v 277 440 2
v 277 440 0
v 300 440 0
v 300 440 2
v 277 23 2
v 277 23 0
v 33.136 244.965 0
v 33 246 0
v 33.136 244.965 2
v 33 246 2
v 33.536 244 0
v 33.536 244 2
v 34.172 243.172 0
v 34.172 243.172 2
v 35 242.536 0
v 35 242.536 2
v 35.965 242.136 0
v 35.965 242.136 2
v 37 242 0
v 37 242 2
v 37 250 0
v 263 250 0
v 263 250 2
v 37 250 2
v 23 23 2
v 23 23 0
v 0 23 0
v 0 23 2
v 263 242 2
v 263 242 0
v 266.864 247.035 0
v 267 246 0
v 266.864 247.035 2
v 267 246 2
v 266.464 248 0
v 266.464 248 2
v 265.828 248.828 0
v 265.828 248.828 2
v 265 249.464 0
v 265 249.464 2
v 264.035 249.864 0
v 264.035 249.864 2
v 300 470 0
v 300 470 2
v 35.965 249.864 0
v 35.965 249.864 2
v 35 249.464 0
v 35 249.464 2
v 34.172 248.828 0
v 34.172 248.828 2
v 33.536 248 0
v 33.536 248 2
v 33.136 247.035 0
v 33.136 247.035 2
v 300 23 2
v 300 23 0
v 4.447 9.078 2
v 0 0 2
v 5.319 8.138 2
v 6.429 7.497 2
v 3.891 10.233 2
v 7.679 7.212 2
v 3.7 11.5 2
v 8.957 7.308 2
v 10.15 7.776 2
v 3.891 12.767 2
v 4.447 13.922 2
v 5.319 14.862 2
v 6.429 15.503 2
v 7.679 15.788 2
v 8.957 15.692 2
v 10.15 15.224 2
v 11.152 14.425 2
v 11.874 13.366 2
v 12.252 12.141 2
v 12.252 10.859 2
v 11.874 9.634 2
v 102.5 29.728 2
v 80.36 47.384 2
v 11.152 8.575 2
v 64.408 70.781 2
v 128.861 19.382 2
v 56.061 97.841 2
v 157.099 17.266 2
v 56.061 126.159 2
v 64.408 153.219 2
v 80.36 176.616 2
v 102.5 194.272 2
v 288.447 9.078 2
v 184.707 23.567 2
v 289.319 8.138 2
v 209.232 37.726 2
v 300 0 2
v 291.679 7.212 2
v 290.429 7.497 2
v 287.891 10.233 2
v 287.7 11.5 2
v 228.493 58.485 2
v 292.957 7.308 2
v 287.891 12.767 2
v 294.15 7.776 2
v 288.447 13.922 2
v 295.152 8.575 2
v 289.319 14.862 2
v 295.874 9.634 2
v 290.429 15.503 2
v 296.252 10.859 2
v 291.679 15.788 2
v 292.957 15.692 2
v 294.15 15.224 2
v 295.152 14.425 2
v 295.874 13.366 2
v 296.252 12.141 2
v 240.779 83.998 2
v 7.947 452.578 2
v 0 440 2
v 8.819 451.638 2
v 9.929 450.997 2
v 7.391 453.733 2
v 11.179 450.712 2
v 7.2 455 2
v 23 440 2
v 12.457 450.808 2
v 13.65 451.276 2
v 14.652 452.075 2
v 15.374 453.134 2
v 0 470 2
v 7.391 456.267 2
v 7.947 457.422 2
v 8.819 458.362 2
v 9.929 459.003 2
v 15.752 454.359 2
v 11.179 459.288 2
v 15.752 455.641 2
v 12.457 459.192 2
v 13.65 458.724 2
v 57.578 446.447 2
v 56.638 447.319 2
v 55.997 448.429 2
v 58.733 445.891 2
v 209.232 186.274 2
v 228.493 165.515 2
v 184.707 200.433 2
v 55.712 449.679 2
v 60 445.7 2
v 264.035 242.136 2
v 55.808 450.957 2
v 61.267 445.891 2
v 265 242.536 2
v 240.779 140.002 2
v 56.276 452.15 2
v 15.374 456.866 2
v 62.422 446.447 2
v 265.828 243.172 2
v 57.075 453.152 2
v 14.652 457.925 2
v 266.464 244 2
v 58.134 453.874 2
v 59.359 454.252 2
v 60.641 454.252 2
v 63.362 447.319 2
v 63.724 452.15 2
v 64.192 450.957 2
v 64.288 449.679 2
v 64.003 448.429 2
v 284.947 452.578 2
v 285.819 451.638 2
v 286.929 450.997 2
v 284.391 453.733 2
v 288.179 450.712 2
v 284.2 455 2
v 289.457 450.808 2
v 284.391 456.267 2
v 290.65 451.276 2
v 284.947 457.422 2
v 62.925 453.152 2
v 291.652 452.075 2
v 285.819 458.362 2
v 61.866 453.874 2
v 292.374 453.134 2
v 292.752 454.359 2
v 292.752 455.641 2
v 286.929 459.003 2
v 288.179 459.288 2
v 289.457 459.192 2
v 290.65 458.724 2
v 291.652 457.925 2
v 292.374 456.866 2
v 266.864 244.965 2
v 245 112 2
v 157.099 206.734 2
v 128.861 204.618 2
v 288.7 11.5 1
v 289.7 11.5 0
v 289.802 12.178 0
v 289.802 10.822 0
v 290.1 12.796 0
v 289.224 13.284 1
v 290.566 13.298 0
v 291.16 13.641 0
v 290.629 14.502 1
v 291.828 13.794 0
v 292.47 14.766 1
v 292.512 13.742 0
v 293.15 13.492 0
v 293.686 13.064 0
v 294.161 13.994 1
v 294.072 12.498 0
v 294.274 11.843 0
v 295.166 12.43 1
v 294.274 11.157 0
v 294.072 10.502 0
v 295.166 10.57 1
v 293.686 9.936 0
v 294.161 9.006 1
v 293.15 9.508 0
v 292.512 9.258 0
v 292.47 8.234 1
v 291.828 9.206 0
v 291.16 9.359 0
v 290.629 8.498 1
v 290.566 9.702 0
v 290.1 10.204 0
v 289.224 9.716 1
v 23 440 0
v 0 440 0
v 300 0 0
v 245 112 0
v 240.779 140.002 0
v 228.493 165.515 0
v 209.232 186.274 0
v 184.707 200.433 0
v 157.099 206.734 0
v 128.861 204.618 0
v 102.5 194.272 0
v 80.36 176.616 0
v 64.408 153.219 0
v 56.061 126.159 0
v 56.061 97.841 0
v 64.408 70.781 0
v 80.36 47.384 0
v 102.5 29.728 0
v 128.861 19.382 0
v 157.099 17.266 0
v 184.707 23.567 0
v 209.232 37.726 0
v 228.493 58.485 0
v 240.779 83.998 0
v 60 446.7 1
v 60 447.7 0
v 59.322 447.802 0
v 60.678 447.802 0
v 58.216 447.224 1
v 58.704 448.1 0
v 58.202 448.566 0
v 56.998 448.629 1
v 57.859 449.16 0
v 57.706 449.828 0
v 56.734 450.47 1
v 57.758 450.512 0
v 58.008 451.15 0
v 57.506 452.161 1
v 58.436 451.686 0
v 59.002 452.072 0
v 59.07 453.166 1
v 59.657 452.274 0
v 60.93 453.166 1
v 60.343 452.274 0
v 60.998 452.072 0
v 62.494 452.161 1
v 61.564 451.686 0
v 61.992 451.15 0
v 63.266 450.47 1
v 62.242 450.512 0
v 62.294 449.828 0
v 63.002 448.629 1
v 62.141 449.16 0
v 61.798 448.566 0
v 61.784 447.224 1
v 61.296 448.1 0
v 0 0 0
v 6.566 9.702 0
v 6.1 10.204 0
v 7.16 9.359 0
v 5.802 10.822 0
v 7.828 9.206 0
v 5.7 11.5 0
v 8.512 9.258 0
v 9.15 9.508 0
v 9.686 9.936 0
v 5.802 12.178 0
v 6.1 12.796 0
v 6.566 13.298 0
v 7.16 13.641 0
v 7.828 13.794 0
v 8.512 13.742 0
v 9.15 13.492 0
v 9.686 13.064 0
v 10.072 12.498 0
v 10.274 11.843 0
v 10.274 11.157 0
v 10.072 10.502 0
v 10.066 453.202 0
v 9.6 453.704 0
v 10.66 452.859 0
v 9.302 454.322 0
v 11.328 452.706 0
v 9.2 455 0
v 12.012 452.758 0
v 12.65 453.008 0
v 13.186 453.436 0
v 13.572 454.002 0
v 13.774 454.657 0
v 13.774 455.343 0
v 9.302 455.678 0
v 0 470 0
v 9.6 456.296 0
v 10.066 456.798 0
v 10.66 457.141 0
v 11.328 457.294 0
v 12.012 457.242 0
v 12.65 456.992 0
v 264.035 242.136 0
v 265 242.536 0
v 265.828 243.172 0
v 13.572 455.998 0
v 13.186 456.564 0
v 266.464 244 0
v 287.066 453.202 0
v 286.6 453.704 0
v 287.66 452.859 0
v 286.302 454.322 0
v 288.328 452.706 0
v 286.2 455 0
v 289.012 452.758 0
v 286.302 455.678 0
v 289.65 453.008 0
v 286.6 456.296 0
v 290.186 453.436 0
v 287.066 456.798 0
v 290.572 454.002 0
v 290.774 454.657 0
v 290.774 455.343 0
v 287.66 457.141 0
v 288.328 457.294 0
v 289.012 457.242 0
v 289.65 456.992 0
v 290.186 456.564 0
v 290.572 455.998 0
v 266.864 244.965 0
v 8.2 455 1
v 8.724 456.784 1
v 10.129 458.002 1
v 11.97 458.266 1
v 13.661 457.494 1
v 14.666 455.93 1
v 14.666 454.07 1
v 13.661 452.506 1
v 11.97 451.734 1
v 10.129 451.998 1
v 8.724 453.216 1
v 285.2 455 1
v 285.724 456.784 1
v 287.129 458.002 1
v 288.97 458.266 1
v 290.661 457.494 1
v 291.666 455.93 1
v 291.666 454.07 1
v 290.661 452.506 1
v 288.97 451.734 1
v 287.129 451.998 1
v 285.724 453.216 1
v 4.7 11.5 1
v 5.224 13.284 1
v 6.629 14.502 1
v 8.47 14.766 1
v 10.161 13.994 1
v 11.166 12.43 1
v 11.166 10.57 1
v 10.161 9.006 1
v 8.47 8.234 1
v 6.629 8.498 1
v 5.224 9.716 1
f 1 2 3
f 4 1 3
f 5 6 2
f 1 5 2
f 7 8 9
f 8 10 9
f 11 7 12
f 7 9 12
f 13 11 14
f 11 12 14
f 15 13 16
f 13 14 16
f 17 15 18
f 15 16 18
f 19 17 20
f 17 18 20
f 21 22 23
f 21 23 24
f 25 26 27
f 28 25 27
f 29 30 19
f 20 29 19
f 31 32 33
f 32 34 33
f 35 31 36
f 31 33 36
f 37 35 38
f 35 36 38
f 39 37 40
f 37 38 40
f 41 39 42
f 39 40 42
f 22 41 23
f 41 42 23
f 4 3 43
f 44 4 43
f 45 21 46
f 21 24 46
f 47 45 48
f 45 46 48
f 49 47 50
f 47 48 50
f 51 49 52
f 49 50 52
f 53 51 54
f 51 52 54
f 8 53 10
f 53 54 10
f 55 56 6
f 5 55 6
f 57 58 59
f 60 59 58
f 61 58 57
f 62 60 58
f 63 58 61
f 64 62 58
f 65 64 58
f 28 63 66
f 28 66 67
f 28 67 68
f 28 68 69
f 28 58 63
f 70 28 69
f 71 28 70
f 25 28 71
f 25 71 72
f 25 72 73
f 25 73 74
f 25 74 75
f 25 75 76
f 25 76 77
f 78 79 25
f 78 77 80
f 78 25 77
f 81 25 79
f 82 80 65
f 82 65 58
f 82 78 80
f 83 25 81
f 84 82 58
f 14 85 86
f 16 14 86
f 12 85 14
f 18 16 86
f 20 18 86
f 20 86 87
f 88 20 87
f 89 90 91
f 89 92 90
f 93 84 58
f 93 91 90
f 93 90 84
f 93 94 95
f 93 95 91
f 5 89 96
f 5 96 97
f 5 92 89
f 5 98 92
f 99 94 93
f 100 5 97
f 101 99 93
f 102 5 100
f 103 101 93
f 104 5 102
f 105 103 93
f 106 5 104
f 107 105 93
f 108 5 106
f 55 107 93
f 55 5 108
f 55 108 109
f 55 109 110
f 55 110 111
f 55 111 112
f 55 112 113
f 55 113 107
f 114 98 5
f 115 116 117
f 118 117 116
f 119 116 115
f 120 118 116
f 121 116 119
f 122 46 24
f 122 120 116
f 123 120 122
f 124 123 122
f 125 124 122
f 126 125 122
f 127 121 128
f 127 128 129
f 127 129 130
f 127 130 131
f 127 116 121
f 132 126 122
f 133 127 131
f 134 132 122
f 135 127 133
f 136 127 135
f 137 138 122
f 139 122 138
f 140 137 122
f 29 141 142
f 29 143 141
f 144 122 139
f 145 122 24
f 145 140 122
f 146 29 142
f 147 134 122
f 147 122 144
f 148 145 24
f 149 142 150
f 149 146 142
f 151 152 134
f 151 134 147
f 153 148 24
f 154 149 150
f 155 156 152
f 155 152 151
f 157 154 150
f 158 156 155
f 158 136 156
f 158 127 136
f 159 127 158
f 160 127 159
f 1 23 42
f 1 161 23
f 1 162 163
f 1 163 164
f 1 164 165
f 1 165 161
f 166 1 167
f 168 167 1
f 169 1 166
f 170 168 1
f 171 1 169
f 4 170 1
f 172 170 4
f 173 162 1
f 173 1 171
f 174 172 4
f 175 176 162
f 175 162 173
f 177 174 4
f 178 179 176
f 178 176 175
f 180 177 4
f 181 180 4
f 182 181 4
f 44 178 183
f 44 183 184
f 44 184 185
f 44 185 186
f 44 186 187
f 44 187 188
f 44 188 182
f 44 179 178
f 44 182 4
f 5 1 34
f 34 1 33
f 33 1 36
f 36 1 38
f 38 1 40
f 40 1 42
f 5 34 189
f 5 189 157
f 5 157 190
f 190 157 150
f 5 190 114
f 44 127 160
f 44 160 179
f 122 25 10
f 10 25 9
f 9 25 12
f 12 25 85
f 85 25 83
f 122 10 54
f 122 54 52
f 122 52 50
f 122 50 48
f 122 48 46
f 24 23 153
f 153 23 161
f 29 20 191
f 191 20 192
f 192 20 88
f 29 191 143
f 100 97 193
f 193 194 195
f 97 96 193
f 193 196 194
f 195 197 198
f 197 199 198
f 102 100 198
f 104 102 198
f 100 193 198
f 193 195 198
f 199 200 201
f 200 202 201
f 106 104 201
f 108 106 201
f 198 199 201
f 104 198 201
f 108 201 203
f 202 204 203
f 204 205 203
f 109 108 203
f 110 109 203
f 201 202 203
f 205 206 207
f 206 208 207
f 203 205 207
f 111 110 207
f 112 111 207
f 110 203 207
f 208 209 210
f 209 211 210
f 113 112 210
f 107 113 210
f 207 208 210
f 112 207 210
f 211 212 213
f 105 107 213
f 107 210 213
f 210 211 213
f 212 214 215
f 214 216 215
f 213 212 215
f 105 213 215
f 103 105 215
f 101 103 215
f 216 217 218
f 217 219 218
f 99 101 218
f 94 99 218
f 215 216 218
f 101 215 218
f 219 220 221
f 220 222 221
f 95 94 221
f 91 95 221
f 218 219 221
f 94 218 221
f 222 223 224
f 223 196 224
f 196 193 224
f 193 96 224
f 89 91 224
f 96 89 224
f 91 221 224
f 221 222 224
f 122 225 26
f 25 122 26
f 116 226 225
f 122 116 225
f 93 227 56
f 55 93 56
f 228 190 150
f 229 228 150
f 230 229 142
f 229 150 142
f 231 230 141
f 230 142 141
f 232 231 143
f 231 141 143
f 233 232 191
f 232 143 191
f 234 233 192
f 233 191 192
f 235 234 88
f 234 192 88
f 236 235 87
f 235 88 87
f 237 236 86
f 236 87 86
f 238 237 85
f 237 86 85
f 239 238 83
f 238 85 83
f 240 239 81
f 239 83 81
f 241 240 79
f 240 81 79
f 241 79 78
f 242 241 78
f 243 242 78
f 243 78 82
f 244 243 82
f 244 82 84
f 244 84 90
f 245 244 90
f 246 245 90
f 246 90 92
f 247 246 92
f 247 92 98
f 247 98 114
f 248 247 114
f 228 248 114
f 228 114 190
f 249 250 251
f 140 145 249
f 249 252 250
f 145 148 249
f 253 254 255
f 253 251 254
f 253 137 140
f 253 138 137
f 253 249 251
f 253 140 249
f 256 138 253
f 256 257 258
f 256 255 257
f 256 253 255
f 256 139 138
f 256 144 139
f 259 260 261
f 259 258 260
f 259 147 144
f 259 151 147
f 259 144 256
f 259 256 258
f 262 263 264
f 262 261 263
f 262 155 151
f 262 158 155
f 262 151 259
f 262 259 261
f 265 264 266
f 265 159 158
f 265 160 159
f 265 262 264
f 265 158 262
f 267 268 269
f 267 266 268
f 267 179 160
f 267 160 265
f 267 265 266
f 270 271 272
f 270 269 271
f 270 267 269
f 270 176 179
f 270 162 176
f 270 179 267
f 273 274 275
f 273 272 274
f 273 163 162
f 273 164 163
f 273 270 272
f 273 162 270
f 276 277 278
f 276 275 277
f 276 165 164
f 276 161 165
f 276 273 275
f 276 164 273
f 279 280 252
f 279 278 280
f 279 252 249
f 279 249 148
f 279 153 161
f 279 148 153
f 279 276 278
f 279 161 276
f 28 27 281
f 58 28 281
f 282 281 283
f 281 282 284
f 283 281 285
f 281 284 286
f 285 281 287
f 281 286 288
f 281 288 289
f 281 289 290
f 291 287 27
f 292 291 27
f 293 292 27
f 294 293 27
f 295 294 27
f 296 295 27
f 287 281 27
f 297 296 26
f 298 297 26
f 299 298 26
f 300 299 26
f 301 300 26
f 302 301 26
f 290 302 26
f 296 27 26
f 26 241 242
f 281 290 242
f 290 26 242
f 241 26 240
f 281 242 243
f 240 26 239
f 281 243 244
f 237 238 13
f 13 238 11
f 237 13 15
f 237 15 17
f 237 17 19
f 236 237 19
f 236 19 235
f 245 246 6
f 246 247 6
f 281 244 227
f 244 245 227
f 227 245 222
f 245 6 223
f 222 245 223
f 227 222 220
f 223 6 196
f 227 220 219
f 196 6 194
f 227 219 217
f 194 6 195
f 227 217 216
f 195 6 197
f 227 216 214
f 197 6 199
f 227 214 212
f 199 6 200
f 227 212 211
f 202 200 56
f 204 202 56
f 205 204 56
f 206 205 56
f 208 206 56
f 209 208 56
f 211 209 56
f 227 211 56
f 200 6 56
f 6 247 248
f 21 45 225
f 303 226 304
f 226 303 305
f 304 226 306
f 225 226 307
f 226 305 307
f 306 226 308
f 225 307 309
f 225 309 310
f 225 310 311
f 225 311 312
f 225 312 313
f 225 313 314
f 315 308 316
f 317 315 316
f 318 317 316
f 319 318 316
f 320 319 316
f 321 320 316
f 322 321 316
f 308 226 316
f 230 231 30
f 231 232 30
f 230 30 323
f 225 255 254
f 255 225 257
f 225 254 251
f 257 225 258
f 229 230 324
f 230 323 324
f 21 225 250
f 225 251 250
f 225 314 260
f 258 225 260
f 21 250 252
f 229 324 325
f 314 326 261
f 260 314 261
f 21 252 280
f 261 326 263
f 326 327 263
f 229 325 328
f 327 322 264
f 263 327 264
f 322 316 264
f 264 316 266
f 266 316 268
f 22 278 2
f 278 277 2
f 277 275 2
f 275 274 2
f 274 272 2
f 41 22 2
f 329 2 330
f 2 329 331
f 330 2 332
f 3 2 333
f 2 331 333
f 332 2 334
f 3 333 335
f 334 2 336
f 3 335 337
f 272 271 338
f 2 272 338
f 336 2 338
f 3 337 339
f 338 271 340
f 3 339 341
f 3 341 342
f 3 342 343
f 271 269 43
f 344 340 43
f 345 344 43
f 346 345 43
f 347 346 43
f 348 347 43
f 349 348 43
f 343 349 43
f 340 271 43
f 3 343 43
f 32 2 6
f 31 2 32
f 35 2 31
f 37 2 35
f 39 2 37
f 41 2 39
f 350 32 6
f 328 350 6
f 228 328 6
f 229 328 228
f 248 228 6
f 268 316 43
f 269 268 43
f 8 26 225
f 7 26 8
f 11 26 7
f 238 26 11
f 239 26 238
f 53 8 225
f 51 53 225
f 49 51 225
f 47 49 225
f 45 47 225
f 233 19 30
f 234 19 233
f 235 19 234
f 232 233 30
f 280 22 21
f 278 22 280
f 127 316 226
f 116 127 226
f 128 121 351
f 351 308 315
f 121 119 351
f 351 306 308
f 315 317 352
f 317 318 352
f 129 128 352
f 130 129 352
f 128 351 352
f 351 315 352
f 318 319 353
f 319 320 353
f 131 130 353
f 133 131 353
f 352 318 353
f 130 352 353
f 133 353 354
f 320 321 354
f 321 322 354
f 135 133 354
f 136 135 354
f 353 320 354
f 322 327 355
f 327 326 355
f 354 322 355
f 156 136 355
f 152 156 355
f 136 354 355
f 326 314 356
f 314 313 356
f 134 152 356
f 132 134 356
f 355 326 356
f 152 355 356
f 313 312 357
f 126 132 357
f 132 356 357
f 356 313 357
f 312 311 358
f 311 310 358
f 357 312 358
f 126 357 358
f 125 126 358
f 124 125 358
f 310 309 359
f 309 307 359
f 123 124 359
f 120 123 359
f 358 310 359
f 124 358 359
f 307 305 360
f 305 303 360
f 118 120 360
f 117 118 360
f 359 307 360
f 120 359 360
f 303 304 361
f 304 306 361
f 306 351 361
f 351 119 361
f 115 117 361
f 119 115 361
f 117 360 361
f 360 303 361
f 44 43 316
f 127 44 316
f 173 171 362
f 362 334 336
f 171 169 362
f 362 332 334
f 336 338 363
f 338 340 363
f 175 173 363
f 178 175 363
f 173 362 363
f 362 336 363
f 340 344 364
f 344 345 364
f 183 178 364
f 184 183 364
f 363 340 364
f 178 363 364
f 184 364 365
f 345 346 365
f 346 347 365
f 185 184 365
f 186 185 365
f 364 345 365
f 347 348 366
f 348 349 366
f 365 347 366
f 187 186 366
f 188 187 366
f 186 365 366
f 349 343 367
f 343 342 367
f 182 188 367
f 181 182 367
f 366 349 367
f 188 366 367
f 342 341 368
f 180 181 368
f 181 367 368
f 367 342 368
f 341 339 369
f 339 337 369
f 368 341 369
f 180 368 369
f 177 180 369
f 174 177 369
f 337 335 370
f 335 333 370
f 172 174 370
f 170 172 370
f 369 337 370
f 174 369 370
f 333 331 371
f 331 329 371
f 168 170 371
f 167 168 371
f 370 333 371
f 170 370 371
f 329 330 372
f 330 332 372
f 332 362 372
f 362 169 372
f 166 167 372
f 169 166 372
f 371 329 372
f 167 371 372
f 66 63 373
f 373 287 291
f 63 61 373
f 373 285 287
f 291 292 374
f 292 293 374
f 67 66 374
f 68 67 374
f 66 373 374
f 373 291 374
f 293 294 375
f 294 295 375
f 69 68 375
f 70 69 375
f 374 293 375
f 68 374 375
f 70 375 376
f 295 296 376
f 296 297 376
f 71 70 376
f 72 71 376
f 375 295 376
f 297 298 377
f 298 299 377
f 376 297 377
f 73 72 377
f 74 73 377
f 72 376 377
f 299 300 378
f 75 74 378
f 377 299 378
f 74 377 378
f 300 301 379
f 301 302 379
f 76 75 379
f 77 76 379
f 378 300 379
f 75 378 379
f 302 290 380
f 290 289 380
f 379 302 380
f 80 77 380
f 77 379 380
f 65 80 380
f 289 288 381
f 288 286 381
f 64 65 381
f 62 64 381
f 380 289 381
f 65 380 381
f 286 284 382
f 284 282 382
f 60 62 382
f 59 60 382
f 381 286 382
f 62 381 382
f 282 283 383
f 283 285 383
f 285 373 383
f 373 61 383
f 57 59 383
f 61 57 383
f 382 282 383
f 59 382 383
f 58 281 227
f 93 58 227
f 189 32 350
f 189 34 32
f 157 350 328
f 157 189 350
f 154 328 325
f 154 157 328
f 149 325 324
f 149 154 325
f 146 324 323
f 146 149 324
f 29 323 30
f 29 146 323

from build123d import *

# Parameters (mm, degrees)
AUFSATZ_LINEAR_AUSTRAGEN1_DEPTH                      = 2
FORMSENKUNG_F_R_M4_SENKSCHRAUBE_MIT_INNE_D           = 4.5
FORMSENKUNG_F_R_M4_SENKSCHRAUBE_MIT_INNE_DEPTH       = 15
FORMSENKUNG_F_R_M4_SENKSCHRAUBE_MIT_INNE_CSINK_D     = 8.6
FORMSENKUNG_F_R_M4_SENKSCHRAUBE_MIT_INNE_CSINK_ANGLE = 90
FORMSENKUNG_F_R_M4_SENKSCHRAUBE_MIT_INNE_TIP         = 1.351936393
SKIZZE4_R                                            = 95
SCHNITT_LINEAR_AUSTRAGEN1_DEPTH                      = 10
ERDUNG_AT_2_COUNT                                    = 2
ERDUNG_AT_2_PITCH                                    = 204.963132201
SKIZZE7_W                                            = 234
SKIZZE7_H                                            = 8
SCHNITT_LINEAR_AUSTRAGEN2_DEPTH                      = 10
VERRUNDUNG1_R                                        = 4


with BuildPart() as part:
    # Skizze1 → Aufsatz-Linear austragen1 (new body)
    with BuildSketch(Plane.XY):
        Polygon((0, 0), (300, 0), (300, 23), (277, 23), (277, 440), (300, 440), (300, 470), (0, 470), (0, 440), (23, 440), (23, 23), (0, 23), align=None)
    extrude(amount=AUFSATZ_LINEAR_AUSTRAGEN1_DEPTH)

    # Formsenkung für M4 Senkschraube mit Innensechskant1
    with Locations(Plane.XY.offset(2)):
        with Locations((292, 11.5), (8, 11.5), (11.5, 455), (288.5, 455)):
            CounterSinkHole(FORMSENKUNG_F_R_M4_SENKSCHRAUBE_MIT_INNE_D / 2, FORMSENKUNG_F_R_M4_SENKSCHRAUBE_MIT_INNE_CSINK_D / 2, depth=FORMSENKUNG_F_R_M4_SENKSCHRAUBE_MIT_INNE_DEPTH, counter_sink_angle=FORMSENKUNG_F_R_M4_SENKSCHRAUBE_MIT_INNE_CSINK_ANGLE)
            with Locations((0, 0, -(FORMSENKUNG_F_R_M4_SENKSCHRAUBE_MIT_INNE_DEPTH + FORMSENKUNG_F_R_M4_SENKSCHRAUBE_MIT_INNE_TIP / 2))):  # 118° drill point
                Cone(0, FORMSENKUNG_F_R_M4_SENKSCHRAUBE_MIT_INNE_D / 2, FORMSENKUNG_F_R_M4_SENKSCHRAUBE_MIT_INNE_TIP, mode=Mode.SUBTRACT)

    # Skizze4 → Schnitt-Linear austragen1 (cut)
    with BuildSketch(Plane.XY.offset(2)):
        with Locations((150, 112)):
            Circle(SKIZZE4_R)
    extrude(amount=-SCHNITT_LINEAR_AUSTRAGEN1_DEPTH, mode=Mode.SUBTRACT)

    # Skizze6 → Erdung (revolve, cut)
    with BuildSketch(Plane(origin=(60, 450, 2), x_dir=(0, -1, 0), z_dir=(1, 0, 0))):
        Polygon((0, 0), (0, 2), (2.25, 2), (2.25, 2.05), (4.3, 0), align=None)
    erdung = revolve(axis=Axis((60, 450, 8.35), (0, 0, -1)), mode=Mode.SUBTRACT)

    # Erdung at 2: Erdung ×2
    with Locations(*[Vector(-0.17833221510322264, 0.9839703354554842, 0) * (i * ERDUNG_AT_2_PITCH) for i in range(1, ERDUNG_AT_2_COUNT)]):
        add(erdung, mode=Mode.SUBTRACT)

    # Skizze7 → Schnitt-Linear austragen2 (cut)
    with BuildSketch(Plane(origin=(0, 0, 0), x_dir=(-1, 0, 0), z_dir=(0, 0, -1))):
        with Locations((-150, 246)):
            Rectangle(SKIZZE7_W, SKIZZE7_H)
    extrude(amount=-SCHNITT_LINEAR_AUSTRAGEN2_DEPTH, mode=Mode.SUBTRACT)

    # Verrundung1
    verrundung1_edges = [part.edges().sort_by_distance(p)[0] for p in [
        (33, 242, 1),
        (33, 250, 1),
        (267, 242, 1),
        (267, 250, 1),
    ]]
    fillet(verrundung1_edges, radius=VERRUNDUNG1_R - 0.0001)  # a hair under: the kernel refuses the full size


solid = part.part
